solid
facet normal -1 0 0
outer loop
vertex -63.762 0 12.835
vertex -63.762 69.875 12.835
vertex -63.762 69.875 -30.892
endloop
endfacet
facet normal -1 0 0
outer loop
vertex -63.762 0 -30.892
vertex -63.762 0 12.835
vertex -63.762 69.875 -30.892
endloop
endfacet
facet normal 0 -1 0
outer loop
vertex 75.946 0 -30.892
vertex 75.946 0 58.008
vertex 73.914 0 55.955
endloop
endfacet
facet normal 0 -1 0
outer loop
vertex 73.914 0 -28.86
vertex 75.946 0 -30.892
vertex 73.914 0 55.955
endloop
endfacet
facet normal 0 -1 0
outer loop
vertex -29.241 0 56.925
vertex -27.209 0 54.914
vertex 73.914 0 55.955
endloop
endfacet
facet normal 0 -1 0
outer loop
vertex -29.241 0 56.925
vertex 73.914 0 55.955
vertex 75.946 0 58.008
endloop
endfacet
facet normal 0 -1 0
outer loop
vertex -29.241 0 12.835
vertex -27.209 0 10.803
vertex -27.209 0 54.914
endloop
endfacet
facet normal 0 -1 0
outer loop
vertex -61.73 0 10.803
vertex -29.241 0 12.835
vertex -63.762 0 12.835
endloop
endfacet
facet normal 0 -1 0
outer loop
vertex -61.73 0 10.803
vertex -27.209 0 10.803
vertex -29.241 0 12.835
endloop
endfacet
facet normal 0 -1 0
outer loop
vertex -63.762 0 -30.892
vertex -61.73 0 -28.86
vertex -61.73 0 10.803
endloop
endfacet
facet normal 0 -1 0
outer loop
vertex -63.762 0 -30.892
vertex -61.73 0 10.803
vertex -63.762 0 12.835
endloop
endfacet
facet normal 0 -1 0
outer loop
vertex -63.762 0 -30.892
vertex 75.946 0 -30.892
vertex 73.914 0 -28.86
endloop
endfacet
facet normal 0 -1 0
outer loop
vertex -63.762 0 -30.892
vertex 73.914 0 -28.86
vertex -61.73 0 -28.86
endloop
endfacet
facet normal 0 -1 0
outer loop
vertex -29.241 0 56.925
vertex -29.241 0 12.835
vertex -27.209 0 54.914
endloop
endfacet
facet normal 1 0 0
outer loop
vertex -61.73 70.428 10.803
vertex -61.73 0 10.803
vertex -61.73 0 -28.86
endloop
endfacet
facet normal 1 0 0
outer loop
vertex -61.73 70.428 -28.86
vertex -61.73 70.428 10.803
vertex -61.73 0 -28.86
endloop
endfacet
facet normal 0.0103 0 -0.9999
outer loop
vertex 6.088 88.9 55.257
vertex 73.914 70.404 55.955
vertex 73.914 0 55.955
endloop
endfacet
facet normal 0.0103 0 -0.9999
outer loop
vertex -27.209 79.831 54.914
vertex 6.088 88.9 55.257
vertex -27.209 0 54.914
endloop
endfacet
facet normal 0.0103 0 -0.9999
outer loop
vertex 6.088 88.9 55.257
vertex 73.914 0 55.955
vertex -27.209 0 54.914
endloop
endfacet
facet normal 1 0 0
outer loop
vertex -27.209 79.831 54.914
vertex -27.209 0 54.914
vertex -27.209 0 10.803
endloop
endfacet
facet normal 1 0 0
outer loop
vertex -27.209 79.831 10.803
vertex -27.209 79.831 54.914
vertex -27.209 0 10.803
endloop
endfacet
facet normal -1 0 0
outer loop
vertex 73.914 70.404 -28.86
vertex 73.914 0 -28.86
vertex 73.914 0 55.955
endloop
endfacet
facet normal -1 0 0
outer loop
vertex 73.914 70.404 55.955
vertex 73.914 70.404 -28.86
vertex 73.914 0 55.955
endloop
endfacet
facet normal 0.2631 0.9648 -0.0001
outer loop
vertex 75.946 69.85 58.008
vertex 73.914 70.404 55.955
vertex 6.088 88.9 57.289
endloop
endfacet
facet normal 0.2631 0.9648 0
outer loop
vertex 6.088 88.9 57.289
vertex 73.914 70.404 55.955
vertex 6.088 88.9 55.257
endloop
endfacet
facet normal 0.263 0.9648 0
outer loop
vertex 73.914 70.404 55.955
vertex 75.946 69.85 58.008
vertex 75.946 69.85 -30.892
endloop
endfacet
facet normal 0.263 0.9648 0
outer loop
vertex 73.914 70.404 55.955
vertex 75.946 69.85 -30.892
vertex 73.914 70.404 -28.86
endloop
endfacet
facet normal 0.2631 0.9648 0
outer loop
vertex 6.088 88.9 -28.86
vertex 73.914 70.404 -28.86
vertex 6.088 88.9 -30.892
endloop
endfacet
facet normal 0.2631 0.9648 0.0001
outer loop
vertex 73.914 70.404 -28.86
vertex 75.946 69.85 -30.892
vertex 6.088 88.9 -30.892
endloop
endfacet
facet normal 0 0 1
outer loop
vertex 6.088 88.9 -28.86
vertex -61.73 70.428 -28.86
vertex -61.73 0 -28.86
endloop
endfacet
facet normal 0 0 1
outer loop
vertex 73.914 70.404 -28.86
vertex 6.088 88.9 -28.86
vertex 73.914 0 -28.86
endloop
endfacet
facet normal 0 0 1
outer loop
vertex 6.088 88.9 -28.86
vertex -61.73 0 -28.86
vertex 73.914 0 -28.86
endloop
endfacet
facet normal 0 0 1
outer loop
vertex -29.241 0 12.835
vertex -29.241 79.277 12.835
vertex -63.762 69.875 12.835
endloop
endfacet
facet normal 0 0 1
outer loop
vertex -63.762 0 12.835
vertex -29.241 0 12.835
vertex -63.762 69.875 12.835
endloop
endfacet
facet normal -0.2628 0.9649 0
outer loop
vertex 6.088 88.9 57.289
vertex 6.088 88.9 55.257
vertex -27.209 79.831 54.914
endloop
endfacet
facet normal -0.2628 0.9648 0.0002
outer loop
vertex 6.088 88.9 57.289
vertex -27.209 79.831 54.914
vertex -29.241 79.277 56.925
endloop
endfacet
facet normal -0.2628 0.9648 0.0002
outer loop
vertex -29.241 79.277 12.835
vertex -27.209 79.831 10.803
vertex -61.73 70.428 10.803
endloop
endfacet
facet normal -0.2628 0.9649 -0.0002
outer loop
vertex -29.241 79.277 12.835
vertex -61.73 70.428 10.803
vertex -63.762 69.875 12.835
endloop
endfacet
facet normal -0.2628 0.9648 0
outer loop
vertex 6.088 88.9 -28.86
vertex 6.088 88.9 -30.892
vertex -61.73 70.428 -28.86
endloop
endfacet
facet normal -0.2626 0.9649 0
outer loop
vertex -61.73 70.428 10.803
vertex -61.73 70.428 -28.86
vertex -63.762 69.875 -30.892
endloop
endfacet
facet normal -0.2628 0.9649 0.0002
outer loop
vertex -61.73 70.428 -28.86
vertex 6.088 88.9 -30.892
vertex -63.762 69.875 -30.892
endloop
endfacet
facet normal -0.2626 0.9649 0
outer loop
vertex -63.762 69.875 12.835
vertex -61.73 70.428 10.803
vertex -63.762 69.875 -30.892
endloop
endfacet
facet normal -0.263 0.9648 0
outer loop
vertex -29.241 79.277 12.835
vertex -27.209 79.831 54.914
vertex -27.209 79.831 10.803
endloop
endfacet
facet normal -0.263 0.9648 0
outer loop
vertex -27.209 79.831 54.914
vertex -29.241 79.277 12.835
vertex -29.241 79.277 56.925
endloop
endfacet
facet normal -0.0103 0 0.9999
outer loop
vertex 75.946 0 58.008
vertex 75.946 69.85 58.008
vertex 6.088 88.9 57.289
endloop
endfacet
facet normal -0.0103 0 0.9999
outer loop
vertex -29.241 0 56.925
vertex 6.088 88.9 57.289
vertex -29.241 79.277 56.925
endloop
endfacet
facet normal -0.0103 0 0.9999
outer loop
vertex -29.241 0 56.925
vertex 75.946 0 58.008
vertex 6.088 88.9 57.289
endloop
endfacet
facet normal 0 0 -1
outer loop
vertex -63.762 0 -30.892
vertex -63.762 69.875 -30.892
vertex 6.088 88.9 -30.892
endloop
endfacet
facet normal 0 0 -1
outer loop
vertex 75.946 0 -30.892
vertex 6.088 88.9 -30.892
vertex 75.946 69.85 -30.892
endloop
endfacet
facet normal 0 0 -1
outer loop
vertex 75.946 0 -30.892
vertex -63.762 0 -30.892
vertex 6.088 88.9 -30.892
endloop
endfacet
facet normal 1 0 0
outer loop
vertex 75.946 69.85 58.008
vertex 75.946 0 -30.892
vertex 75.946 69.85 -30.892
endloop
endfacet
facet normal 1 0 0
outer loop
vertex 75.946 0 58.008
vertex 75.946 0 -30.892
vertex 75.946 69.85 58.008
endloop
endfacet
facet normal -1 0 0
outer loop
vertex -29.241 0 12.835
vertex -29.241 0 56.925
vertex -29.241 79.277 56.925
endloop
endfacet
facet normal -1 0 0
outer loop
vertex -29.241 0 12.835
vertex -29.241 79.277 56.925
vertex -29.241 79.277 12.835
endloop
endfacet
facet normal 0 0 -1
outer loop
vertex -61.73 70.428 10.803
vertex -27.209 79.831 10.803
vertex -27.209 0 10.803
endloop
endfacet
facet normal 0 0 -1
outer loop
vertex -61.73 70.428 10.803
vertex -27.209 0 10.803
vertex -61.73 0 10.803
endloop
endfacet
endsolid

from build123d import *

# Parameters (mm, degrees)
BOSS_EXTRUDE1_DEPTH = 88.9
CUT_EXTRUDE1_DEPTH  = 102.108


with BuildPart() as part:
    # Sketch2 → Boss-Extrude1 (new body)
    with BuildSketch(Plane(origin=(0, 0, 0), x_dir=(1, 0, 0), z_dir=(0, 1, 0))):
        Polygon((-63.761896162, 30.891565806), (75.945697976, 30.891565806), (75.945697976, -58.008434194), (-29.241124355, -56.925429588), (-29.241124355, -12.83474515), (-63.761896162, -12.83474515), align=None)
        Polygon((-61.729896162, -10.80274515), (-61.729896162, 28.859565806), (73.913697976, 28.859565806), (73.913697976, -55.955405), (-27.209124355, -54.91424338), (-27.209124355, -10.80274515), align=None, mode=Mode.SUBTRACT)
    extrude(amount=BOSS_EXTRUDE1_DEPTH)

    # Sketch3 → Cut-Extrude1 (cut)
    with BuildSketch(Plane(origin=(0, 0, -30.891565806), x_dir=(-1, 0, 0), z_dir=(0, 0, -1))):
        Polygon((-75.945697976, 69.85), (-6.088103838, 88.9), (63.761896162, 69.874738021), (86.047504552, 68.33004544), (86.047504552, 107.907647221), (-94.439058548, 107.907647221), (-94.439058548, 69.85), align=None)
    extrude(amount=-CUT_EXTRUDE1_DEPTH, mode=Mode.SUBTRACT)


solid = part.part
